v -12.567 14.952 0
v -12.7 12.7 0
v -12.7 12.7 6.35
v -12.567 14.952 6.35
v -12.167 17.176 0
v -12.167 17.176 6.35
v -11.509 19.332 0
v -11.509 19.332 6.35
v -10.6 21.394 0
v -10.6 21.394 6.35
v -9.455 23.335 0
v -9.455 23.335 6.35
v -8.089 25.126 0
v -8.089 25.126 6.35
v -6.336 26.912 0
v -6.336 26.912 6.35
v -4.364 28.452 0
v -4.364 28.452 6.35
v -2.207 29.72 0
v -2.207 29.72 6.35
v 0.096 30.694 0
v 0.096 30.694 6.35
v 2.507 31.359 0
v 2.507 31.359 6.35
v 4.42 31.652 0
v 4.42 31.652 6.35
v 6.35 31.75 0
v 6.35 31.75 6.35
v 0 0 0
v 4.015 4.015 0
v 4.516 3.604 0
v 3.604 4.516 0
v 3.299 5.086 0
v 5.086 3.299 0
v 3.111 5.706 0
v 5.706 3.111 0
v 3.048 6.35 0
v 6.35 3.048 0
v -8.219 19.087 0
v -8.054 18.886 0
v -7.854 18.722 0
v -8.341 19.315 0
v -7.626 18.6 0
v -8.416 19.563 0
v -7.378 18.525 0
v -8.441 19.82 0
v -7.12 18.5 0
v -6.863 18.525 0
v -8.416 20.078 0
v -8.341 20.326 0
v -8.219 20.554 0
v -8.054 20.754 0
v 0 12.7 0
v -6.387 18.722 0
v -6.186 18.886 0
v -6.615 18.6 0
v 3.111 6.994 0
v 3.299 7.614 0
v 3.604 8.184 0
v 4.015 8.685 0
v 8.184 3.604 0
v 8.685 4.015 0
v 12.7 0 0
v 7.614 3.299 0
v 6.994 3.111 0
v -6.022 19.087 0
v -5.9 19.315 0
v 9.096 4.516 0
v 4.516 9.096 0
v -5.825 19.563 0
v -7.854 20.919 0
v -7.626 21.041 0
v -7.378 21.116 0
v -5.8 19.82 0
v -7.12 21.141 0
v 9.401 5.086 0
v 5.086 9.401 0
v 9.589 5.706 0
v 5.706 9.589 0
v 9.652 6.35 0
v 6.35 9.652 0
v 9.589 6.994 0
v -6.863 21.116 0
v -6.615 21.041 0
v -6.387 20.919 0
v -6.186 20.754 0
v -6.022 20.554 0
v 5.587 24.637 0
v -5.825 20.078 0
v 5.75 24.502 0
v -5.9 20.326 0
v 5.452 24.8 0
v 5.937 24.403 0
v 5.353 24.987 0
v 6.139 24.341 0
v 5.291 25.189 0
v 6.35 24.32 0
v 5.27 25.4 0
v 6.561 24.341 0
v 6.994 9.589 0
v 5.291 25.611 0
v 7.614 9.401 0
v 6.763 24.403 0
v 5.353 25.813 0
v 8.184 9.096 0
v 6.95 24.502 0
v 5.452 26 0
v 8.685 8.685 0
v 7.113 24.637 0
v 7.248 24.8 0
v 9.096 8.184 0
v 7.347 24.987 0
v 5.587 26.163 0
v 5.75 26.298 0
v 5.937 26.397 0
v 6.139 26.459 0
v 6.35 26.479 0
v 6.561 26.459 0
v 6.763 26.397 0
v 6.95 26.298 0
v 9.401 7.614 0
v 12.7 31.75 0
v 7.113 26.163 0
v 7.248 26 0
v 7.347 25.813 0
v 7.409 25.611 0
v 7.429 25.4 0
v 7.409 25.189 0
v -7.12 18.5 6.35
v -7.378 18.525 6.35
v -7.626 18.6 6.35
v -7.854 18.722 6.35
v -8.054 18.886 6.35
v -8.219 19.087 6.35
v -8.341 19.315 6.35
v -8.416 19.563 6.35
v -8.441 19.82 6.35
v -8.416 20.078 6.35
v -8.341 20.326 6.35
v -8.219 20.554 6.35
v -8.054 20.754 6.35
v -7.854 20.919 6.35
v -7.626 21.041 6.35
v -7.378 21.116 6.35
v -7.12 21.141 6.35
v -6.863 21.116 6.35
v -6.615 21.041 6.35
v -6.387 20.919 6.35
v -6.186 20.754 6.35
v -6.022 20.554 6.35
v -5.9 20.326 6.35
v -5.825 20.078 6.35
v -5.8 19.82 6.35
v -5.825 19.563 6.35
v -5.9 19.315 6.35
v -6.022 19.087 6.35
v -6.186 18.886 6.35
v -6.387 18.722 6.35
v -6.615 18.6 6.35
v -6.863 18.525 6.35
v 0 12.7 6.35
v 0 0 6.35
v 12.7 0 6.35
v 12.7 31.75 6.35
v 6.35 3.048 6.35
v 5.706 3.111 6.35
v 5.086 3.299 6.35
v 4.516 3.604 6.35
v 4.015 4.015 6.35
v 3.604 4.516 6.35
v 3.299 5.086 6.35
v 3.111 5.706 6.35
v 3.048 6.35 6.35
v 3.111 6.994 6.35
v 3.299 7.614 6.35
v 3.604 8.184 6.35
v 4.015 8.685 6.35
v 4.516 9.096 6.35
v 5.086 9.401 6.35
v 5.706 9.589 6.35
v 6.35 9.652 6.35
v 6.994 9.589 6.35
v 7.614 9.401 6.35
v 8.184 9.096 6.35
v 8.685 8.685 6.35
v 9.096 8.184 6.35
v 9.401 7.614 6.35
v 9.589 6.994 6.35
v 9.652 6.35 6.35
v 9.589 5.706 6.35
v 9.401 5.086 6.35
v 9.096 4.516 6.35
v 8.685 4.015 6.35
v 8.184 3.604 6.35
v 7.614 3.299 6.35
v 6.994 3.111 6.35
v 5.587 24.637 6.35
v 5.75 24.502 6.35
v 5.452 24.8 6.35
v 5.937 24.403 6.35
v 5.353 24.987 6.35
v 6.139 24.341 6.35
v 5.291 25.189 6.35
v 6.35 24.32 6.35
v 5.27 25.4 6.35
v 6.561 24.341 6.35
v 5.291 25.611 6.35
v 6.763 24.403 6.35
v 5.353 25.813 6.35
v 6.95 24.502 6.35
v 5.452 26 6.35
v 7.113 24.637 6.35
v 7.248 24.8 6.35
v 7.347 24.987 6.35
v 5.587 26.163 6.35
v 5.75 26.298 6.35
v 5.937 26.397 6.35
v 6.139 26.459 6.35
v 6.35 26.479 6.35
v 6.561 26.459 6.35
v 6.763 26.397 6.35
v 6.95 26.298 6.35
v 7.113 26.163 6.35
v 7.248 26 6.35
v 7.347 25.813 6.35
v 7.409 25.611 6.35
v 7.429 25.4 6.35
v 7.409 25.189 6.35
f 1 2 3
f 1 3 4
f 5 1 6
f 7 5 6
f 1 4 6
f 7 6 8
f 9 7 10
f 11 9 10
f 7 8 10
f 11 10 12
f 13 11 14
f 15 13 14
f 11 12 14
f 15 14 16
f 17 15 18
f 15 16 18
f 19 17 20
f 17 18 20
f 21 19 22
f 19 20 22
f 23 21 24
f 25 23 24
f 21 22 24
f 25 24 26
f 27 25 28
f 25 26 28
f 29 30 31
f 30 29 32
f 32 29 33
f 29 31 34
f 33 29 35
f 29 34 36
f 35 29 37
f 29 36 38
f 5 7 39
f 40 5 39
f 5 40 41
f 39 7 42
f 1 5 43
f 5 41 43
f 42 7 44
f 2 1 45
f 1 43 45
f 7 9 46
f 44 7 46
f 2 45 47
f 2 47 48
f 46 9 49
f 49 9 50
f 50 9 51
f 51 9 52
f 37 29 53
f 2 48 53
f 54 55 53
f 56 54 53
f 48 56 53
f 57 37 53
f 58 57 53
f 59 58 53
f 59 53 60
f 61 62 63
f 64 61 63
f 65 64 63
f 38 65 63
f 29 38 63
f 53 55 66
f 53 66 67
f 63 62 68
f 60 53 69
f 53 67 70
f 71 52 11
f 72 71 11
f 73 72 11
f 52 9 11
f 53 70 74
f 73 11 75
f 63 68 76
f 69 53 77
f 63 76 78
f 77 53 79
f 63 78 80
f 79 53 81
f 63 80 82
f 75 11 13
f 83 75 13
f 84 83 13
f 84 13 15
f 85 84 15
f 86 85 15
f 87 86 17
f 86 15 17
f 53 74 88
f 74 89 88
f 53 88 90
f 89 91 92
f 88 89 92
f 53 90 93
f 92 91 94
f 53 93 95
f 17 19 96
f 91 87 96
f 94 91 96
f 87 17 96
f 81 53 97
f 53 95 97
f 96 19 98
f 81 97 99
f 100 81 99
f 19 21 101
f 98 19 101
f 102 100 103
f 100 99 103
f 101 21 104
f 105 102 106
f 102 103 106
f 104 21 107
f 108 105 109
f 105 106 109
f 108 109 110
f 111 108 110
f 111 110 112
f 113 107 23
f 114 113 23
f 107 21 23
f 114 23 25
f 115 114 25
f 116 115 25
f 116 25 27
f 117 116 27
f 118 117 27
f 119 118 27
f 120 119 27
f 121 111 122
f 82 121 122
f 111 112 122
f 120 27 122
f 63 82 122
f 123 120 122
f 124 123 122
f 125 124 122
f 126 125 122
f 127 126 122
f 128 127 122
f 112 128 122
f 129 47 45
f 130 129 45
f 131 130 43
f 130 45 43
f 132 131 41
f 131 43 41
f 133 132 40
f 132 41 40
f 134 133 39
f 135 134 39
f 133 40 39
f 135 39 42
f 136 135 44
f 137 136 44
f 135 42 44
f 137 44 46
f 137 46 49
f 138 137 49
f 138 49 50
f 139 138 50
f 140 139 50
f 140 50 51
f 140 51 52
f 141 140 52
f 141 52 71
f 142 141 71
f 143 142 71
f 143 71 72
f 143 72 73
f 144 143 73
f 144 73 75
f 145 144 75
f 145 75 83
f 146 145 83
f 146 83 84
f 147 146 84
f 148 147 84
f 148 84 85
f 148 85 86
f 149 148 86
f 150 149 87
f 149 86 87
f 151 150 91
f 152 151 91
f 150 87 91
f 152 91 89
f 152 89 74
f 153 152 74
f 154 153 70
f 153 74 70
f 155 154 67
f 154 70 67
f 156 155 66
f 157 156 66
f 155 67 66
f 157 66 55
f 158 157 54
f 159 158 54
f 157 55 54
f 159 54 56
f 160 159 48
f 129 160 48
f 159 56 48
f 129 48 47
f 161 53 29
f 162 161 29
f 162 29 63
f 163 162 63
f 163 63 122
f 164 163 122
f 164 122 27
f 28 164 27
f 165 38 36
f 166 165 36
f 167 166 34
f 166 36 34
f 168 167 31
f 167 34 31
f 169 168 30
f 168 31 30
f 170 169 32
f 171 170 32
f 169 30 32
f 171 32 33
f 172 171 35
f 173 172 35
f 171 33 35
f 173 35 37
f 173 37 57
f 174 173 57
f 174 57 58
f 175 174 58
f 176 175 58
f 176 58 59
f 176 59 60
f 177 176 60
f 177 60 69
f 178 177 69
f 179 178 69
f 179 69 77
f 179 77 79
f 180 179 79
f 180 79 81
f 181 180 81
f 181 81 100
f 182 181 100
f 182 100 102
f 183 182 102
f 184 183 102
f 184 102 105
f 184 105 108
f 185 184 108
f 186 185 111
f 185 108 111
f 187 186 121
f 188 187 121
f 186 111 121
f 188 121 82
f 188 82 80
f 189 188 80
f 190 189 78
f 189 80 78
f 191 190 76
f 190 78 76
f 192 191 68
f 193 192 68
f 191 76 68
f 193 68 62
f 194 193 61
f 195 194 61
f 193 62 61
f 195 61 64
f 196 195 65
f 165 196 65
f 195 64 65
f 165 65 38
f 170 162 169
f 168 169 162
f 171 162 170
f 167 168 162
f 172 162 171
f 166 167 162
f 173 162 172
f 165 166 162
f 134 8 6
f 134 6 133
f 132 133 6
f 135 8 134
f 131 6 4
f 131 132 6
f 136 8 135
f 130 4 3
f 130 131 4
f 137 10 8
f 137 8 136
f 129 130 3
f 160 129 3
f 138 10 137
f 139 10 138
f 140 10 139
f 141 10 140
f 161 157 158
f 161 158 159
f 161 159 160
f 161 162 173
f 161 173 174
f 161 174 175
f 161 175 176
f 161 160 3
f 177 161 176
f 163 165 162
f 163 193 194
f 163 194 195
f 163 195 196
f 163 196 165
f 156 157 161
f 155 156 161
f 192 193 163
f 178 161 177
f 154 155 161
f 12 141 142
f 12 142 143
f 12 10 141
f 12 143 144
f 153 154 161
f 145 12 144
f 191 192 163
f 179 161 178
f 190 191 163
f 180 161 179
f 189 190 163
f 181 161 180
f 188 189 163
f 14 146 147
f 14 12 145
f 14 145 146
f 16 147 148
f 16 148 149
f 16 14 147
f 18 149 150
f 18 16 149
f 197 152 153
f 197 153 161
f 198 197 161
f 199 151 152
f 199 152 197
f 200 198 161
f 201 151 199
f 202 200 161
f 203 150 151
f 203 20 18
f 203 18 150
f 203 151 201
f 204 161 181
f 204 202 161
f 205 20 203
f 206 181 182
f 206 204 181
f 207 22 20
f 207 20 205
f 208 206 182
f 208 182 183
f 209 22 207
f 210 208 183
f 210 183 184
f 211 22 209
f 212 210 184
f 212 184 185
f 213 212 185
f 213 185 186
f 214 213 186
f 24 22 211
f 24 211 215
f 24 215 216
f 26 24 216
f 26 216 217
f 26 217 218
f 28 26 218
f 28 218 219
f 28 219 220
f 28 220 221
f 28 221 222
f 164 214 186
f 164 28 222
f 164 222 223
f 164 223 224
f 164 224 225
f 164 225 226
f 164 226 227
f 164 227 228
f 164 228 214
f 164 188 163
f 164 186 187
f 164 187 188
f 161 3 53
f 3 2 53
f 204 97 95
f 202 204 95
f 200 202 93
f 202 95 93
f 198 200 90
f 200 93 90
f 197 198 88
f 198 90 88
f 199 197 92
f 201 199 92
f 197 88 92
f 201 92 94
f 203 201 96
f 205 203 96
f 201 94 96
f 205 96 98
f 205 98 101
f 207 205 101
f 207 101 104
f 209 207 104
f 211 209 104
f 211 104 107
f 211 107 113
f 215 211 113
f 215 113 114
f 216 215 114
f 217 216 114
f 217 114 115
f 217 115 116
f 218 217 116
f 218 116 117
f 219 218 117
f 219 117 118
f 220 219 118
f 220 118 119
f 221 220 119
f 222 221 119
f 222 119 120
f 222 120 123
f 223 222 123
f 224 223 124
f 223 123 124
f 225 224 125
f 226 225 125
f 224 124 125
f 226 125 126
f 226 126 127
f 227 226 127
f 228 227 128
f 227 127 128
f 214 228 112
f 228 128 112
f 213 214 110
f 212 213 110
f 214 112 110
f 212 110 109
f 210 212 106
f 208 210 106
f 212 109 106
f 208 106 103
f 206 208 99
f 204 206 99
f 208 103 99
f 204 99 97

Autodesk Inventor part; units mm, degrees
ref_plane "YZ Plane" through (0, 0, 0) normal (1, 0, 0) x (0, 1, 0)
ref_plane "XZ Plane" through (0, 0, 0) normal (0, 1, 0) x (-1, 0, 0)
ref_plane "XY Plane" through (0, 0, 0) normal (0, 0, 1) x (1, 0, 0)
sketch "Sketch1" plane through (0, 0, 0) normal (0, 0, 1) x (1, 0, 0)
  line L0 (0, 0) -> (12.7, 0)
  line L1 (12.7, 0) -> (12.7, 31.75)
  line L2 (12.7, 31.75) -> (0, 31.75)
  line L3 (0, 12.7) -> (0, 0)
  line L4 (12.7, 31.75) -> (-12.7, 31.75)
  line L5 (-12.7, 31.75) -> (-12.7, 12.7)
  line L6 (-12.7, 12.7) -> (0, 12.7)
  line L7 (12.7, 12.7) -> (12.7, 31.75)
  dimension "d1" = 31.75
  dimension "d2" = 25.4
  dimension "d3" = 19.05
  dimension "d4" = 12.7
  dimension "d5" = 12.7
extrude "Extrusion1" add sketch "Sketch1" along normal blind 6.35
fillet "Fillet1" radius 19.05 1 edges at (-12.7, 31.75, 3.175)
sketch "Sketch2" plane through (0, 0, 6.35) normal (0, 0, 1) x (1, 0, 0)
  line L0 (12.7, 0) -> (12.7, 31.75) projected
  line L1 (0, 0) -> (12.7, 0) projected
  point P0 (6.35, 6.35)
  dimension "d11" = 6.35
  dimension "d12" = 6.35
hole "Hole1" at (6.35, 6.35, 6.35) direction (0, 0, -1) diameter 6.604 end through all
sketch "Sketch3" plane through (0, 0, 6.35) normal (0, 0, 1) x (1, 0, 0)
  line L0 (12.7, 0) -> (12.7, 31.75) projected
  line L1 (12.7, 31.75) -> (6.35, 31.75) projected
  point P0 (0, 0)
  point P1 (6.35, 25.4)
  dimension "d20" = 6.35
  dimension "d21" = 6.35
hole "Hole2" at (6.35, 25.4, 6.35) direction (0, 0, -1) diameter 2.159 end through all
sketch "Sketch4" plane through (0, 0, 6.35) normal (0, 0, 1) x (1, 0, 0)
  circle A0 centre (6.35, 6.35) radius 3.302 projected
  circle A1 centre (6.35, 6.35) radius 19.05
  line L0 (-7.1204, 19.8204) -> (6.35, 6.35)
  line L1 (12.7, 0) -> (12.7, 31.75) projected
  point P0 (0, 0)
  dimension "d29" = 38.1
  dimension "d30" = 45
hole "Hole3" at (-7.1204, 19.8204, 6.35) direction (0, 0, -1) diameter 2.6416 end through all thread size "6-32 UNC" class "2B" standard "ANSI Unified Screw Threads"
equation "\"d12\" = d11"
equation "\"d21\" = d20"
properties part number "Shooter_Stop"
